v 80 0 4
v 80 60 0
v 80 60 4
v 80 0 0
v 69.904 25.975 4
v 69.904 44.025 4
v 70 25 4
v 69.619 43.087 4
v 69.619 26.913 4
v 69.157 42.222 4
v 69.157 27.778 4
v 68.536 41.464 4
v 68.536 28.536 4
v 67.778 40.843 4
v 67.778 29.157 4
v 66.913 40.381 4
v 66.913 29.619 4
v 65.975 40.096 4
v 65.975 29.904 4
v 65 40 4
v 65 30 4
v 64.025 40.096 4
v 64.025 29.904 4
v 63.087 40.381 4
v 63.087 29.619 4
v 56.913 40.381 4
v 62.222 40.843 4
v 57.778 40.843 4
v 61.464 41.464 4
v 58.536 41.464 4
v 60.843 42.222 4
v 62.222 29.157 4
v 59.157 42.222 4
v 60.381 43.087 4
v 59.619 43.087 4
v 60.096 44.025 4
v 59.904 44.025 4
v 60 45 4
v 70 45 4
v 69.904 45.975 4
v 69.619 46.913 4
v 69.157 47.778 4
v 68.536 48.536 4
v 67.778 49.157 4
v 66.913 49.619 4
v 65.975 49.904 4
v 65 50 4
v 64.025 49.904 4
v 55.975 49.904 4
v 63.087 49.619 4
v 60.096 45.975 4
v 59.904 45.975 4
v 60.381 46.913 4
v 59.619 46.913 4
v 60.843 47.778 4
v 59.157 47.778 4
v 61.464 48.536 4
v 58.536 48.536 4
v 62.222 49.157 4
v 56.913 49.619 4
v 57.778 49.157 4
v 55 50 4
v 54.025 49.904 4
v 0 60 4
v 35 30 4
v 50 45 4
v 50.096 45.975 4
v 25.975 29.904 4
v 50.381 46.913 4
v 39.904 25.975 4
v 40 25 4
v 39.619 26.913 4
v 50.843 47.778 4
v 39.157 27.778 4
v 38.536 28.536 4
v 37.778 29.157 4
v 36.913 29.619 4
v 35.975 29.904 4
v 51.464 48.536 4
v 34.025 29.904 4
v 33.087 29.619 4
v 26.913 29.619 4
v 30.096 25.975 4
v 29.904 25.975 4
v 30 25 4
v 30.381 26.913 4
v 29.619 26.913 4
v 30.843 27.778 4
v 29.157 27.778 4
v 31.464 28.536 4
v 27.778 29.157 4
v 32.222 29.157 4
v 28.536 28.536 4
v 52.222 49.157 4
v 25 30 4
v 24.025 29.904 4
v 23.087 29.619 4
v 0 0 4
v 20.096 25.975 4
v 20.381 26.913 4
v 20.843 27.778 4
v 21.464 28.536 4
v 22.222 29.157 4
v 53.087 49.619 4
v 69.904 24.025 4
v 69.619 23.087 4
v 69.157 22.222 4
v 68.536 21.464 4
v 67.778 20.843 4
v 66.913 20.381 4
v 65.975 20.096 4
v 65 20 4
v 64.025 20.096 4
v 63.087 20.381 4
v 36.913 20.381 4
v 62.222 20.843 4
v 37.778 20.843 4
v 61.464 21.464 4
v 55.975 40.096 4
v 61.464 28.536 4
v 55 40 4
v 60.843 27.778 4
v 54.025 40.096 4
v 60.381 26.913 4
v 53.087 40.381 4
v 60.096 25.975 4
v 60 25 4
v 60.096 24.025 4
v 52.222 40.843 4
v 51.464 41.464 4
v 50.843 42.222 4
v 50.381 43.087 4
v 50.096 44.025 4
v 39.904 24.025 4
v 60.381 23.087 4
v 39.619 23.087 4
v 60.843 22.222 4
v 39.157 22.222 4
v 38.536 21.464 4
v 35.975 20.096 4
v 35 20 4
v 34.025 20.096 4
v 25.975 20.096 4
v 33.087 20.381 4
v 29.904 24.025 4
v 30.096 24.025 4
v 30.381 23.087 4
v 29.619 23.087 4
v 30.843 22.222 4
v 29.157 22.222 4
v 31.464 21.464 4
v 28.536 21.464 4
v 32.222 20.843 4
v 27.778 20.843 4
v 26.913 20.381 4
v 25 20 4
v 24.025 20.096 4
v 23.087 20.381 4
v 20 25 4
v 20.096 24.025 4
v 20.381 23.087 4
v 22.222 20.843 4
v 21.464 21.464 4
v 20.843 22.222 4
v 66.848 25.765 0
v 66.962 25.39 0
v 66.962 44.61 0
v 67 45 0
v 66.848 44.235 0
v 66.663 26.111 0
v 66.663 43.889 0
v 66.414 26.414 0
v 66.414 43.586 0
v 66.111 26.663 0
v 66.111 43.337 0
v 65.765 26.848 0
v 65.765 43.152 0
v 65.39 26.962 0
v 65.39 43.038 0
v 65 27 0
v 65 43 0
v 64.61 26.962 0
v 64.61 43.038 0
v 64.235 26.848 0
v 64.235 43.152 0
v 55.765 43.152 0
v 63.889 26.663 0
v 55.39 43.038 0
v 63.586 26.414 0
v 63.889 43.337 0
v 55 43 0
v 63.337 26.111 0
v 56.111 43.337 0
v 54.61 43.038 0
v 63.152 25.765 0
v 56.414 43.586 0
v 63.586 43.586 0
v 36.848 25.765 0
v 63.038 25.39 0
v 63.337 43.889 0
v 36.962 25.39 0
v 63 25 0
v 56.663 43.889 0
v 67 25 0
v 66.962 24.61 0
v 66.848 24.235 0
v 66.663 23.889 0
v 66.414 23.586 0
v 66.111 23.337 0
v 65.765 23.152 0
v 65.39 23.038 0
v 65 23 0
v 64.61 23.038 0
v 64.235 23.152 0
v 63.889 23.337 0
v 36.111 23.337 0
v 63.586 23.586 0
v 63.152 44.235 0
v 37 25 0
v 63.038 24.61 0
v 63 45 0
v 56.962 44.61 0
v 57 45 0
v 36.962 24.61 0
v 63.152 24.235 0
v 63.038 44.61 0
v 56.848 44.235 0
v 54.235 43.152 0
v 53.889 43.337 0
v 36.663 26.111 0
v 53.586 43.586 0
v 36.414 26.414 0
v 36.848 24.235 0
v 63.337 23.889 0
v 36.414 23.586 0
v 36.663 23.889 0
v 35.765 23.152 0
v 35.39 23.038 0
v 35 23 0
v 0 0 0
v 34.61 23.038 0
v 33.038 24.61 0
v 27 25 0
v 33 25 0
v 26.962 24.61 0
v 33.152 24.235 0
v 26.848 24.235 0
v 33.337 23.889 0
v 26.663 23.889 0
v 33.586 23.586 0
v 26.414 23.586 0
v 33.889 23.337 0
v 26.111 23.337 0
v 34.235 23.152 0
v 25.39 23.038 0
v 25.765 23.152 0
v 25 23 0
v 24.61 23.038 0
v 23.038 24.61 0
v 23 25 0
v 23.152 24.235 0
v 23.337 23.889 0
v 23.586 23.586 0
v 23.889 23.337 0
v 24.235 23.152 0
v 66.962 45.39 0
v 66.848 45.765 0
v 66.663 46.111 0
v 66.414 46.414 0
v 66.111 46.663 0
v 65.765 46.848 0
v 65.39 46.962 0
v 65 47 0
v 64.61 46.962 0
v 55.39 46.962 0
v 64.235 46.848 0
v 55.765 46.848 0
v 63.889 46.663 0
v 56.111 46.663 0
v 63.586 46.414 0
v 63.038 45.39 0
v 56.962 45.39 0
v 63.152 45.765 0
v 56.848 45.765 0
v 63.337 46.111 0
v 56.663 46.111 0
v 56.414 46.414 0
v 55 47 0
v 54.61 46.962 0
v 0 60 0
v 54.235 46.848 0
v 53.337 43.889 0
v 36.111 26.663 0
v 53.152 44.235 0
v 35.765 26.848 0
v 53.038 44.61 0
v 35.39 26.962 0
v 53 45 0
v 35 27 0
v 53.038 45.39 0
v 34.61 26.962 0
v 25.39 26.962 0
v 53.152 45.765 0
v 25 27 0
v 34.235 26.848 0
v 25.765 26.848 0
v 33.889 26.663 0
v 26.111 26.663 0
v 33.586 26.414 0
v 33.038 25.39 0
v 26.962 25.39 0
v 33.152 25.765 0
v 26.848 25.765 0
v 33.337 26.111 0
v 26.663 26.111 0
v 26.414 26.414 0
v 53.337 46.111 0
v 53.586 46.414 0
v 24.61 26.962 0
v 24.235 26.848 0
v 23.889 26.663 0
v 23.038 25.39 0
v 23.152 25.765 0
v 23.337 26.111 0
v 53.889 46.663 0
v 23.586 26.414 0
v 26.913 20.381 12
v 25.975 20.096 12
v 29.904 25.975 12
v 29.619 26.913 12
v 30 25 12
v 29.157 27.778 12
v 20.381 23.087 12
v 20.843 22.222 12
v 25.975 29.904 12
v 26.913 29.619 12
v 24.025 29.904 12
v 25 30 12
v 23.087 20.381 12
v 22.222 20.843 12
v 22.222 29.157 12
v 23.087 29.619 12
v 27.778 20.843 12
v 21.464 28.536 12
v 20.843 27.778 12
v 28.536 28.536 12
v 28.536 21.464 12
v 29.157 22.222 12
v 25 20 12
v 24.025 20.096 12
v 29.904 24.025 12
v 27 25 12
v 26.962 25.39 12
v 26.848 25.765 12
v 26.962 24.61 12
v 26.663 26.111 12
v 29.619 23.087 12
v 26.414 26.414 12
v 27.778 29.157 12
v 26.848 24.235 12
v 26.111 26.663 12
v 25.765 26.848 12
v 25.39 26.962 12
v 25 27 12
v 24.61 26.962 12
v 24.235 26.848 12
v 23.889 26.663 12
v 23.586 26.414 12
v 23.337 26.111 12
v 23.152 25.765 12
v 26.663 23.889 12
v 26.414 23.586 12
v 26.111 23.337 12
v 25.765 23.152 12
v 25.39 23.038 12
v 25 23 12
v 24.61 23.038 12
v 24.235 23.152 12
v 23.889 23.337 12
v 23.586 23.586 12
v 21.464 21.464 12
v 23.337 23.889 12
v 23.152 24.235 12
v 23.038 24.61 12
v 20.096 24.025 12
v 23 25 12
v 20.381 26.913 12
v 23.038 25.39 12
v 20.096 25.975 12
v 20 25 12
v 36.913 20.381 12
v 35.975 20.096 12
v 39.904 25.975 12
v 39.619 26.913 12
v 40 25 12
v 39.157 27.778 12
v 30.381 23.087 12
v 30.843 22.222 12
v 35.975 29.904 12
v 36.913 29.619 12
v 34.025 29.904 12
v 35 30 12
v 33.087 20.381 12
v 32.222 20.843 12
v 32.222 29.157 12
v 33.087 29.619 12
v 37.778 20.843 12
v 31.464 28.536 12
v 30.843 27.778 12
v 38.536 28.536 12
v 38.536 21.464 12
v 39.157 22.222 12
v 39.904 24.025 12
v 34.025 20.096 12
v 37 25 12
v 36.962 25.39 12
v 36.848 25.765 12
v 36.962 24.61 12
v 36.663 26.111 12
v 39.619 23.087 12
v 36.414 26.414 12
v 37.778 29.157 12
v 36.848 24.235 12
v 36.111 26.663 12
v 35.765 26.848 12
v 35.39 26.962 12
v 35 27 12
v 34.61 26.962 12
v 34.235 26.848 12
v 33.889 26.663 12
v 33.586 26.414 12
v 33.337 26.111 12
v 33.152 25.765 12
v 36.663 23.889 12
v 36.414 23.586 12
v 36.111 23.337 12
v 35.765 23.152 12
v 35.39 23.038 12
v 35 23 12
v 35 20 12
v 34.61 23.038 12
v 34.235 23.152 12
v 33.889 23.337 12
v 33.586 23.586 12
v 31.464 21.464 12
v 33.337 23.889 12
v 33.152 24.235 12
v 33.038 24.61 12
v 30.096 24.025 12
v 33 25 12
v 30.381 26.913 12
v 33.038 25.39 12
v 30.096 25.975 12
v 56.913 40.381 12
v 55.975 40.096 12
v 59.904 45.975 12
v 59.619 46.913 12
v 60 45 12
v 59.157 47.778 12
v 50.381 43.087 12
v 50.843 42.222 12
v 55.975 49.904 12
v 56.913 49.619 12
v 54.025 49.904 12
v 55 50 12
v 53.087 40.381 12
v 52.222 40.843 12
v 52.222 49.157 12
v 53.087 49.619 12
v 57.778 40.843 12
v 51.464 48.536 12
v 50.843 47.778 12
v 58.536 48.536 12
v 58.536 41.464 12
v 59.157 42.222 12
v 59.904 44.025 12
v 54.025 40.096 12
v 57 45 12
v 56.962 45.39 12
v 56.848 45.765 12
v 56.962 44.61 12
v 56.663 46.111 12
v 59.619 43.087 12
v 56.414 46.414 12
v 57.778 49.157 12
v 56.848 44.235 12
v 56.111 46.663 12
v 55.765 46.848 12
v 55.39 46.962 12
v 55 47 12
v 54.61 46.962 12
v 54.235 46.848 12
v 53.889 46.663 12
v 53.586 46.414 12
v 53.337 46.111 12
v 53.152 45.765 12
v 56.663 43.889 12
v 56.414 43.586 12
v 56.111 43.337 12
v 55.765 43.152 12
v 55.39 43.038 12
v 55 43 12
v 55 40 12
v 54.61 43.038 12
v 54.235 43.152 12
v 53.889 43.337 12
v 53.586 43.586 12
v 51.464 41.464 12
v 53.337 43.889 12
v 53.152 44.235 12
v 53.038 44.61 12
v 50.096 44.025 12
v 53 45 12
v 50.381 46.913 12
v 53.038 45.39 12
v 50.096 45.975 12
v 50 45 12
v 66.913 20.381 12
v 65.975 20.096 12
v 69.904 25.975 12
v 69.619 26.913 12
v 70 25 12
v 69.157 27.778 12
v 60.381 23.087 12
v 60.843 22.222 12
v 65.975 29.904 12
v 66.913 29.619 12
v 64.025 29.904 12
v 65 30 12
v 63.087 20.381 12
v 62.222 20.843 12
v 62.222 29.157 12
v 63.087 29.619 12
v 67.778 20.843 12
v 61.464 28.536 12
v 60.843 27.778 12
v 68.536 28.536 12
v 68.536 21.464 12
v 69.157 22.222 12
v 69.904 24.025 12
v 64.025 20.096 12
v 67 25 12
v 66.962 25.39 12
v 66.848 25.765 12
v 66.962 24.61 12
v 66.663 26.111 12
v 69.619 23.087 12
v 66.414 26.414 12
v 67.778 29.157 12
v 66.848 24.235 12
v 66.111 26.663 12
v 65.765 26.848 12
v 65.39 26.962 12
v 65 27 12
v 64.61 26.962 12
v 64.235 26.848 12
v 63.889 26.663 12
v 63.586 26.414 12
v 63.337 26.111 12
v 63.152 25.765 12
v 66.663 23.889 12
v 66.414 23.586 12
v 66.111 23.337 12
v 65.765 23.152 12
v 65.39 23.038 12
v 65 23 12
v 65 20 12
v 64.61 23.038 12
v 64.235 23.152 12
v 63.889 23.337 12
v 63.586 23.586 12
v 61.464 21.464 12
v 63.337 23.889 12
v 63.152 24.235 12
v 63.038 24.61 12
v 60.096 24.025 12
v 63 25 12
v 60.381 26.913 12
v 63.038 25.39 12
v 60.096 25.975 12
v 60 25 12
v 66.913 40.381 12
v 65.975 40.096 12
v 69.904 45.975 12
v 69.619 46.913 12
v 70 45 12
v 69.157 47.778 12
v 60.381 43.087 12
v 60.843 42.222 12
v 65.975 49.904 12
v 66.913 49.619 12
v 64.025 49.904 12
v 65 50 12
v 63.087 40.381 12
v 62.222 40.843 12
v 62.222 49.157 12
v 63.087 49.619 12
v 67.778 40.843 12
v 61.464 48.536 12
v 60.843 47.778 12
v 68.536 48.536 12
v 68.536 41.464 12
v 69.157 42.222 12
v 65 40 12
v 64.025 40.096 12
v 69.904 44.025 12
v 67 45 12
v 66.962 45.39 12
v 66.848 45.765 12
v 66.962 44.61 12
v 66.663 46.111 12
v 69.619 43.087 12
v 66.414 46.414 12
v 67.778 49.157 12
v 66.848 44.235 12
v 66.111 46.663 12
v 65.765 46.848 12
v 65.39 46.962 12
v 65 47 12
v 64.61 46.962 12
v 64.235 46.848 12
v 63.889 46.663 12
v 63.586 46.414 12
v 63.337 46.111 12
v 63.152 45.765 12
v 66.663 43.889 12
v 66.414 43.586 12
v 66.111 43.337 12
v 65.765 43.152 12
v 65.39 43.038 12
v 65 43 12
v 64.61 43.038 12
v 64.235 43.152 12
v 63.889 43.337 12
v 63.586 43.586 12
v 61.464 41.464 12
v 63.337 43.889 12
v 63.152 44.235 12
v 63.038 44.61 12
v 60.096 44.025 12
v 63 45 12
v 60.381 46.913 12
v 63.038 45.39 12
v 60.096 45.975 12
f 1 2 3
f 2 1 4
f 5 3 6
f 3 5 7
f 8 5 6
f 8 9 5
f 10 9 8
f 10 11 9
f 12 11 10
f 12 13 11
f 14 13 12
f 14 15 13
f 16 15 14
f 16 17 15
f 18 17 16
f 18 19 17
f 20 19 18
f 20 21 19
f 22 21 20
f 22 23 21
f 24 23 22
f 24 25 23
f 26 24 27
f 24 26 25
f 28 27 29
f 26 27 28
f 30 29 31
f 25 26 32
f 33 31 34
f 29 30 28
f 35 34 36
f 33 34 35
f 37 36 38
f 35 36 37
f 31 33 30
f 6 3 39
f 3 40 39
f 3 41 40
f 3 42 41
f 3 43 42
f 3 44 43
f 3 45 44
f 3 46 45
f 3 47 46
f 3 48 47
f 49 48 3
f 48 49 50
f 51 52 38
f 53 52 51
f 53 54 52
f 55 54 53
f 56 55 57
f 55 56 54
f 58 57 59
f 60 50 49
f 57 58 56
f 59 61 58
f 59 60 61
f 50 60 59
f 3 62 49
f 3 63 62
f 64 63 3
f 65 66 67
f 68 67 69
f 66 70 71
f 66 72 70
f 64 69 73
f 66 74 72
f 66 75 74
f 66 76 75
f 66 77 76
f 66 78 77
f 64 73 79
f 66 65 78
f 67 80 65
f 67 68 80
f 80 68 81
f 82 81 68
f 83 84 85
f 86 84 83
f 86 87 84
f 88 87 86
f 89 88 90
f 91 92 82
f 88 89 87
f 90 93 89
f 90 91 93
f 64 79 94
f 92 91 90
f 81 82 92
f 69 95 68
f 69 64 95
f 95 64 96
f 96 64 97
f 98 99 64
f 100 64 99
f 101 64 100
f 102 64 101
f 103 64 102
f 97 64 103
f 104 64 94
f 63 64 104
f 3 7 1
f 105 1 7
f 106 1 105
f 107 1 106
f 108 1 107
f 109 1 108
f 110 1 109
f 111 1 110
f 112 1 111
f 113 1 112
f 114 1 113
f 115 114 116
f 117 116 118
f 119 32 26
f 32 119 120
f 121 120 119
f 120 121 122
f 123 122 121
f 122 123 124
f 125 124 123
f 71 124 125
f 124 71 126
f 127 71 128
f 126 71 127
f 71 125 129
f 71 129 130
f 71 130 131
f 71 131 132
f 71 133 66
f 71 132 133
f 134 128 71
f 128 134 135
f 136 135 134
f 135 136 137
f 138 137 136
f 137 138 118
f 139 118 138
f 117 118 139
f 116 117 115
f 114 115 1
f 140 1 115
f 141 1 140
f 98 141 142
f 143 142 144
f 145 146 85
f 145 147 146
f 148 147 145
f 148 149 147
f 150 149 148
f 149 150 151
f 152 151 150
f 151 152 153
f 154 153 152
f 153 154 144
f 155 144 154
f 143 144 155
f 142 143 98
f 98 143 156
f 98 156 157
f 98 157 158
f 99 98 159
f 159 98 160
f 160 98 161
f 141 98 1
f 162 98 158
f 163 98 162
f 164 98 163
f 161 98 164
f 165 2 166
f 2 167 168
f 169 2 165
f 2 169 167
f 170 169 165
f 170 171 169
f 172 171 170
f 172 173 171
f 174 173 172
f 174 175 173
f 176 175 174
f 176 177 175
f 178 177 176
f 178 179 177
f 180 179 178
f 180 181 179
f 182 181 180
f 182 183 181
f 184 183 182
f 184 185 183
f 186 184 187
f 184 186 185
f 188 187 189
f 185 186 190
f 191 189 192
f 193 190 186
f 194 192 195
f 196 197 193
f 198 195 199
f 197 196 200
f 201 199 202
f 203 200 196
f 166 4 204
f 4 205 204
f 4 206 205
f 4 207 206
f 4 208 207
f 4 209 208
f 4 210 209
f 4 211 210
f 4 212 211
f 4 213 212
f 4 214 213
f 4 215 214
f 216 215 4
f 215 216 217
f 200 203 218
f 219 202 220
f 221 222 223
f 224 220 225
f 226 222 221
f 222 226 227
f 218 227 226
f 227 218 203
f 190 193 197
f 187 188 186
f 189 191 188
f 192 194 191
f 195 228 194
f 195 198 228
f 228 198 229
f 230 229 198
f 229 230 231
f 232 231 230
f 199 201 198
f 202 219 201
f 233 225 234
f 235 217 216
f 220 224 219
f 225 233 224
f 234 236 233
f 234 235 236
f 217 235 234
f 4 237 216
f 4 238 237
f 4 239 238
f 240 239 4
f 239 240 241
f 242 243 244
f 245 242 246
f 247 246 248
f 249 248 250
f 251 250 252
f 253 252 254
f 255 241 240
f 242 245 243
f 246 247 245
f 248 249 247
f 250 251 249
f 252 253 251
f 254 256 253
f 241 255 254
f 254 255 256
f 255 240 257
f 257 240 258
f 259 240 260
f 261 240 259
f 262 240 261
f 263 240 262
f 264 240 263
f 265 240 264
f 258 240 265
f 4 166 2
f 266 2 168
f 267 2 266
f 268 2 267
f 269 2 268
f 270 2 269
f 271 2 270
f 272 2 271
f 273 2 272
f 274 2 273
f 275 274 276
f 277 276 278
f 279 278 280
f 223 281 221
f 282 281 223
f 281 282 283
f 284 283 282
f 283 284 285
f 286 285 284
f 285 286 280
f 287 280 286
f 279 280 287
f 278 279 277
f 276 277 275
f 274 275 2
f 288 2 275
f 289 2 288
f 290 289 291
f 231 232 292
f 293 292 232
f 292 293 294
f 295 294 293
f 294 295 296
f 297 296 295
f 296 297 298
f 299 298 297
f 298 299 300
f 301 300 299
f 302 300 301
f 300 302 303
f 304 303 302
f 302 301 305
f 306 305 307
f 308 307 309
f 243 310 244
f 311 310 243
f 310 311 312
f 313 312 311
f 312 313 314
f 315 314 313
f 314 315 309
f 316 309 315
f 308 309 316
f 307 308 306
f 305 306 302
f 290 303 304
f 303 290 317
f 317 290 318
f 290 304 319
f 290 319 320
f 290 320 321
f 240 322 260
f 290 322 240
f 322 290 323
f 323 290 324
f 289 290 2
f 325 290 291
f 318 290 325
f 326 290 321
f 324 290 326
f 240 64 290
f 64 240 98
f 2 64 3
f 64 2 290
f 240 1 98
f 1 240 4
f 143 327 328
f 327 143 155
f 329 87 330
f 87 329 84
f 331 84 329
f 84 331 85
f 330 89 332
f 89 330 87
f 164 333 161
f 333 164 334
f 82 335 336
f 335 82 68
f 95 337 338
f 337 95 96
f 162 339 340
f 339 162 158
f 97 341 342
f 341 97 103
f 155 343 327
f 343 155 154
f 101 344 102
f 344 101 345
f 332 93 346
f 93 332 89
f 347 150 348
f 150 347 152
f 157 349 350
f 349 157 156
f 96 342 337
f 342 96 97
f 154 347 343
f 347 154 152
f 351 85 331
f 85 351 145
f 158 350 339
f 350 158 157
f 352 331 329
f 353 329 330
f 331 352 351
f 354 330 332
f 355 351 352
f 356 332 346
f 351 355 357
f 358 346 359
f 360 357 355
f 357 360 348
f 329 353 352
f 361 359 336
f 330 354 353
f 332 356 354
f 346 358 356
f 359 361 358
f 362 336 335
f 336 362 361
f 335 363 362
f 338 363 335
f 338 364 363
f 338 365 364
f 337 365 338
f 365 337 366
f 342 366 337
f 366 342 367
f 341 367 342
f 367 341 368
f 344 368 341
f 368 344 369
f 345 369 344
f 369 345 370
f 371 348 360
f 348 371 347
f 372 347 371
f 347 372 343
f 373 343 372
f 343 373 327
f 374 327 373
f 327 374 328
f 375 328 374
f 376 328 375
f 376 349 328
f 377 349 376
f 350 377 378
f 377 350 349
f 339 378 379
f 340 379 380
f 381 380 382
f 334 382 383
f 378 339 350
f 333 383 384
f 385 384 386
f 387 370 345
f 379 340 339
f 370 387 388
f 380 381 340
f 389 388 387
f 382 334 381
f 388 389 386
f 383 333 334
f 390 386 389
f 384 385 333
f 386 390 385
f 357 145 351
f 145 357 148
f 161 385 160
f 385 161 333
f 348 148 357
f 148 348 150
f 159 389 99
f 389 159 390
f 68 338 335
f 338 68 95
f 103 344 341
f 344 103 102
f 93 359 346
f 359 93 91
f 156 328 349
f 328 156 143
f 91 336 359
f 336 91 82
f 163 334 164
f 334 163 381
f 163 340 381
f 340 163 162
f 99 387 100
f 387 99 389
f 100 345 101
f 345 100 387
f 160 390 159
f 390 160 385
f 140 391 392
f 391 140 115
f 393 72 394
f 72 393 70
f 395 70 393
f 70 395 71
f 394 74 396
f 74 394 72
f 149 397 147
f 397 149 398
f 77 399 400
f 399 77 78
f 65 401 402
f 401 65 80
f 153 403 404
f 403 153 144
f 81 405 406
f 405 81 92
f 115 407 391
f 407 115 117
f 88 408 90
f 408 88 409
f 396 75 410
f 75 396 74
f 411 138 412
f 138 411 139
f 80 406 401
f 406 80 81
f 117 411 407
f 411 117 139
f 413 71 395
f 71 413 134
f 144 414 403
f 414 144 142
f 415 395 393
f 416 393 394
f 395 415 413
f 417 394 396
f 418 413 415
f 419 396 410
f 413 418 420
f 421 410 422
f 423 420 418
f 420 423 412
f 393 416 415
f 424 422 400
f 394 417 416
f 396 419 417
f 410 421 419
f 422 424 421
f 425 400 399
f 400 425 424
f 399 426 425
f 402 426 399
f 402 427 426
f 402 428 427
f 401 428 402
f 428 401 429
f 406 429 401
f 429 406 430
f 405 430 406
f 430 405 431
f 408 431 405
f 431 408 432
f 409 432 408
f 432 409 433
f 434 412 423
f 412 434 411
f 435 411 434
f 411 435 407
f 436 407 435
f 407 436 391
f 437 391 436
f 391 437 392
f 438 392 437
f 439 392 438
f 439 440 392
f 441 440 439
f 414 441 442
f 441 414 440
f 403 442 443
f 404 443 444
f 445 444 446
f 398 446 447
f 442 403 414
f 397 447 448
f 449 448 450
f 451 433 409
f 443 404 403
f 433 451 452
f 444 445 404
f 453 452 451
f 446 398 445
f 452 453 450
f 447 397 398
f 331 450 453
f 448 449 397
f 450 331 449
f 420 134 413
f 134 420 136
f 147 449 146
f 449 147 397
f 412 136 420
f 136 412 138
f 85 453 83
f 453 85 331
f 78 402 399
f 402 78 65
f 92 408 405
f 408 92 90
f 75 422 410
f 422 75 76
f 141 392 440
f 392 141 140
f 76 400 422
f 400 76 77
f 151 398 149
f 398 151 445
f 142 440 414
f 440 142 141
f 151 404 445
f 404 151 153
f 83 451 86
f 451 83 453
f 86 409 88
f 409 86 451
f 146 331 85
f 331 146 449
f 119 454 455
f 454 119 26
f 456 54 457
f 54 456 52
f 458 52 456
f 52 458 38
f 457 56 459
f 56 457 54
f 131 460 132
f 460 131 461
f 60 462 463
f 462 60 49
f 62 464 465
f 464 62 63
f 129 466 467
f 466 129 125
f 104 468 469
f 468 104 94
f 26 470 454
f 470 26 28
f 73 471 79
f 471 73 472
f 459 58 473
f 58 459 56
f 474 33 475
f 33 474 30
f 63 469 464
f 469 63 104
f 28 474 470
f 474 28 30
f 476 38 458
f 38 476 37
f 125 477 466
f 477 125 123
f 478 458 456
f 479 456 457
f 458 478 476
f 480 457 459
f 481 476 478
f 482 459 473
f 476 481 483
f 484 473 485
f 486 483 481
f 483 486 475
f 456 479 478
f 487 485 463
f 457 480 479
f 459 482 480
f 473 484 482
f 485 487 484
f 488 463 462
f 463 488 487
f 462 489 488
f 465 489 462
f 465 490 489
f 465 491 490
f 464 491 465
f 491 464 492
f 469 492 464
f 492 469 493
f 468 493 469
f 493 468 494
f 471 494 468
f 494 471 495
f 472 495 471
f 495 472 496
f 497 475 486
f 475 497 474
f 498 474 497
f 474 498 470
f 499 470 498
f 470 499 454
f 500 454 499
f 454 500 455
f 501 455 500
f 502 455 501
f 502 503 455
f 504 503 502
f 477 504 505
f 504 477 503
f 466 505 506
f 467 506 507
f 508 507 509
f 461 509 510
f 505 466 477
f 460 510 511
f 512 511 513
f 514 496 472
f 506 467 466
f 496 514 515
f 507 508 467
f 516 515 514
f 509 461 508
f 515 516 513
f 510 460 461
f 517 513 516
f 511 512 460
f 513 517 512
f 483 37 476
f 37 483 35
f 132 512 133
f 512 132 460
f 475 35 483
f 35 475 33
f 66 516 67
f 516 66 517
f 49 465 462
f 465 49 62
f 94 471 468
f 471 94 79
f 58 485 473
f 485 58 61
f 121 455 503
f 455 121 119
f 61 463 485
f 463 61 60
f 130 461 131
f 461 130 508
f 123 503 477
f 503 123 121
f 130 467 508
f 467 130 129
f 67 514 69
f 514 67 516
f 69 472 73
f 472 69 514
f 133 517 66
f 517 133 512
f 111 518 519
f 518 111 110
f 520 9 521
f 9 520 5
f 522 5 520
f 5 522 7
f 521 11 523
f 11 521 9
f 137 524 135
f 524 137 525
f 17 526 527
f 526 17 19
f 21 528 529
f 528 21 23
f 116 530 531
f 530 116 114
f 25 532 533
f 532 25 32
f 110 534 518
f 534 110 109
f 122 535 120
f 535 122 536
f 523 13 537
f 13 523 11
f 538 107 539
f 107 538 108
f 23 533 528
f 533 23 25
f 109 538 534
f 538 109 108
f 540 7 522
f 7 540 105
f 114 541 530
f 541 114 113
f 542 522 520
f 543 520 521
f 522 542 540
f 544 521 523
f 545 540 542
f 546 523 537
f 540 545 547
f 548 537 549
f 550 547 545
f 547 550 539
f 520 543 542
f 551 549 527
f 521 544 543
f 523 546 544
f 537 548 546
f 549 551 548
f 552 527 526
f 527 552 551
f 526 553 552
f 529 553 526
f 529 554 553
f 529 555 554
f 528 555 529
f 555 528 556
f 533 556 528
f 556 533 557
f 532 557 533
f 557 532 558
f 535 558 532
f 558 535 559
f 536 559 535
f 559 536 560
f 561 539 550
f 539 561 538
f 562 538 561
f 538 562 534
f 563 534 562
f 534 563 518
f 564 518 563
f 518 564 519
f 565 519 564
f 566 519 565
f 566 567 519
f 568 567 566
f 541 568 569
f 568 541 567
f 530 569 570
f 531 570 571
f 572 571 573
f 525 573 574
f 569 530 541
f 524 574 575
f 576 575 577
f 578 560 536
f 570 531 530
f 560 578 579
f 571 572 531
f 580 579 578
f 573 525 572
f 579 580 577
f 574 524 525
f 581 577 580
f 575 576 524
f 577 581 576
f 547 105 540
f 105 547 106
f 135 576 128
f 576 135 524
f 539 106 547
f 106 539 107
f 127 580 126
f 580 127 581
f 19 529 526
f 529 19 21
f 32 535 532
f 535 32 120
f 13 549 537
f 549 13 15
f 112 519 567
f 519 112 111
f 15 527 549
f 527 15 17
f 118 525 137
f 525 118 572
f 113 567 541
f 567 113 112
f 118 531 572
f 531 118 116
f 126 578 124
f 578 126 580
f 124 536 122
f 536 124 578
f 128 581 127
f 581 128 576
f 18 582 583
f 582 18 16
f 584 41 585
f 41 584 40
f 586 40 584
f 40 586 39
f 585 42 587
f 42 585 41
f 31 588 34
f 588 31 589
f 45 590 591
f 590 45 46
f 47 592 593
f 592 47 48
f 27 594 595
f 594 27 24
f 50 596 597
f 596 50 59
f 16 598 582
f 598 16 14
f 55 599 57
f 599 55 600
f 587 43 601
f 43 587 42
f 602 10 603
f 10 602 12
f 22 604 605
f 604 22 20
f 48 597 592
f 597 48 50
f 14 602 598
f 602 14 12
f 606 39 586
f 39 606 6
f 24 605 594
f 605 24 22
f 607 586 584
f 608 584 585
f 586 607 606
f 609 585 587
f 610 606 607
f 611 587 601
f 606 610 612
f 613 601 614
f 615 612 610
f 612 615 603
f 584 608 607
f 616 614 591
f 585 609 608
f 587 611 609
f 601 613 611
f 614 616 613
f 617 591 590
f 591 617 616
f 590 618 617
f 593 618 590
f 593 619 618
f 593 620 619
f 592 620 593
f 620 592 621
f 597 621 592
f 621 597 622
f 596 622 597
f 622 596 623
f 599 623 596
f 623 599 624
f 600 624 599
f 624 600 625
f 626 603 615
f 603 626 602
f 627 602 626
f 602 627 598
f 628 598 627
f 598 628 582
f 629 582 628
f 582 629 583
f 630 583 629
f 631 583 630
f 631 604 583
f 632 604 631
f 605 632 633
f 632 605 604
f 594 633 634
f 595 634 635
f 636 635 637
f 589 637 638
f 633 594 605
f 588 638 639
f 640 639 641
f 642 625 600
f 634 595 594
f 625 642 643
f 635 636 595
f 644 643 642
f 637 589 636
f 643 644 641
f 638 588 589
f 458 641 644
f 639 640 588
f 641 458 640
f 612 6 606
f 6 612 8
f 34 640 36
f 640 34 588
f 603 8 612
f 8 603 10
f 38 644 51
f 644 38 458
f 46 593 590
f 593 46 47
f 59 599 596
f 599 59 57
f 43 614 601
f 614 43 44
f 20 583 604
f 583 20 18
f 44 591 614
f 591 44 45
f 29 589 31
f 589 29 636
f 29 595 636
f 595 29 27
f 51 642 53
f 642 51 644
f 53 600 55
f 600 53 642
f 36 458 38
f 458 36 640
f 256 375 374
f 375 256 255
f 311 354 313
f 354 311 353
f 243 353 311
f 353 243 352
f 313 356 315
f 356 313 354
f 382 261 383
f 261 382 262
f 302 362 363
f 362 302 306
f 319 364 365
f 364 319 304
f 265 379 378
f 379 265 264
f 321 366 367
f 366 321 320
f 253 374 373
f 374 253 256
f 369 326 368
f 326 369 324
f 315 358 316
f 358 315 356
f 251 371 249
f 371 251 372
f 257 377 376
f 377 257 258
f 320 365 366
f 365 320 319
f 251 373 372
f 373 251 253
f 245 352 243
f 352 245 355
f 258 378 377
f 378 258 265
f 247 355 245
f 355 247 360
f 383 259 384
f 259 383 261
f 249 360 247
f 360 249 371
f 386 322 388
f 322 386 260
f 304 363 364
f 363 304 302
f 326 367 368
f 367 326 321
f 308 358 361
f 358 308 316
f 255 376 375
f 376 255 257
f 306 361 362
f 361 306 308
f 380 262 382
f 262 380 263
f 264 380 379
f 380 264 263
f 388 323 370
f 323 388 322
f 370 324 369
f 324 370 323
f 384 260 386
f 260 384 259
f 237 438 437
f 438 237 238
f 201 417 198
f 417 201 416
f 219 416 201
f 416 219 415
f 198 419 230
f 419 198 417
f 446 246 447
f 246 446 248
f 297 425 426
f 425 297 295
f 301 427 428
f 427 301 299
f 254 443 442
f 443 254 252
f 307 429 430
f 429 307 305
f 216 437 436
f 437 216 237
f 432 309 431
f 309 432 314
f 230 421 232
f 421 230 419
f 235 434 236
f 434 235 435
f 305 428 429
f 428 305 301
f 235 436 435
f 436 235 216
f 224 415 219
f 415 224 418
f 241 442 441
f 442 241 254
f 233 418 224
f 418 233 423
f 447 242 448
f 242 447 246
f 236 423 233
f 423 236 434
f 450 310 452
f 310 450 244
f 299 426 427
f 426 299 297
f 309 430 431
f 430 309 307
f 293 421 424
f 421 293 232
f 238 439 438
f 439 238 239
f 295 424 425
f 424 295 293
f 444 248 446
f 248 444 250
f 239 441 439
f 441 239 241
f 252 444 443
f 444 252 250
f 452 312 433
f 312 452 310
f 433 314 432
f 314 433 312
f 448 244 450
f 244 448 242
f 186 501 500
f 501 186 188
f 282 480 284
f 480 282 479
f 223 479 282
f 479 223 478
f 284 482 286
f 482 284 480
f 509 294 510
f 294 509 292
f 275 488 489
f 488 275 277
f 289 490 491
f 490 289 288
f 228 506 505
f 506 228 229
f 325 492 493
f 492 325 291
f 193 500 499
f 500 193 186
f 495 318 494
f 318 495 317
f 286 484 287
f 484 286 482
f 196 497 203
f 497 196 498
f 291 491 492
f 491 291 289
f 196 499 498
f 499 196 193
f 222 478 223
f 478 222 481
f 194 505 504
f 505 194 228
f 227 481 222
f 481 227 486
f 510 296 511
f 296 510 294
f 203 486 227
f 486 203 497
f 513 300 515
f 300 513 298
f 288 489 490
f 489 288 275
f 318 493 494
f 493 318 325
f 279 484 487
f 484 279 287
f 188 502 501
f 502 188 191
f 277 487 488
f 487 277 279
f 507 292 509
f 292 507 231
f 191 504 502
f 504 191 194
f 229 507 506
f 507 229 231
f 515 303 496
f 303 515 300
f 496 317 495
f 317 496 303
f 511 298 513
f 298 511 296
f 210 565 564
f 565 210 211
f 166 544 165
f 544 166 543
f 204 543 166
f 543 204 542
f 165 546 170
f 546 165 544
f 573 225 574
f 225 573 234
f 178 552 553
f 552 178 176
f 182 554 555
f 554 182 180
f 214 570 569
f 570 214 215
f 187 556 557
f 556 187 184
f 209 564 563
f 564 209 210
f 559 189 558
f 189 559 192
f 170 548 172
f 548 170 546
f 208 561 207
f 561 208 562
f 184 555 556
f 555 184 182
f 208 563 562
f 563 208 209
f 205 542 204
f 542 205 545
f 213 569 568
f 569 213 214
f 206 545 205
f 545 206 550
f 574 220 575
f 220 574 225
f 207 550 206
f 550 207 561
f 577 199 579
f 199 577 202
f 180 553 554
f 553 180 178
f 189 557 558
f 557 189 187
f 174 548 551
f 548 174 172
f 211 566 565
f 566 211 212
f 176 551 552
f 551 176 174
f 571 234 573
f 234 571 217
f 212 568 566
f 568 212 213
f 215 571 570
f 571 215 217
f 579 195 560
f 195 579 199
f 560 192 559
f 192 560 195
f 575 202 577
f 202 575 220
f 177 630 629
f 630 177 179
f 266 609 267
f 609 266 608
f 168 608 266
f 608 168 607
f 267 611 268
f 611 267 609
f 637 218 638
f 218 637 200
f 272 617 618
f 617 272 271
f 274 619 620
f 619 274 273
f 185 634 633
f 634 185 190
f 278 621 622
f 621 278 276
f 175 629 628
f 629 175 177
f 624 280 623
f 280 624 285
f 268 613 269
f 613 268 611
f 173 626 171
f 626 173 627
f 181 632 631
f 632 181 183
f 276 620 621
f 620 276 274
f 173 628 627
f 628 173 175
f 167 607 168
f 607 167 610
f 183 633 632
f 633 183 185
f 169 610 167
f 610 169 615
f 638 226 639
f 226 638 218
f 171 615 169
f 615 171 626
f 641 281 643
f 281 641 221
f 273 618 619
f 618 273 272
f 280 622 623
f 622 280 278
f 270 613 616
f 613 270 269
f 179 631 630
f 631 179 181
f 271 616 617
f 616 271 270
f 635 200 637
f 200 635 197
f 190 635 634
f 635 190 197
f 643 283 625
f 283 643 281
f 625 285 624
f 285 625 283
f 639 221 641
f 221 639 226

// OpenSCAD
$fn = 32;

// ----------------------------------------------------------------------
// Boss field: plate with bosses at given coordinates
// ----------------------------------------------------------------------

// --- parameters (mm) ---
plate_l = 80;             // plate length, X
plate_w = 60;             // plate width, Y
plate_t = 4;              // plate thickness, Z
boss_d = 10;              // boss diameter
boss_h = 8;               // boss height above the plate
bore_d = 4;               // boss bore

total_h = plate_t + boss_h;  // overall height

difference() {
  union() {
    cube([plate_l, plate_w, plate_t]);
    translate([25, 25, plate_t]) cylinder(h = boss_h, d = boss_d);
    translate([35, 25, plate_t]) cylinder(h = boss_h, d = boss_d);
    translate([55, 45, plate_t]) cylinder(h = boss_h, d = boss_d);
    translate([65, 25, plate_t]) cylinder(h = boss_h, d = boss_d);
    translate([65, 45, plate_t]) cylinder(h = boss_h, d = boss_d);
  }
  translate([25, 25, -1]) cylinder(h = total_h + 2, d = bore_d);
  translate([35, 25, -1]) cylinder(h = total_h + 2, d = bore_d);
  translate([55, 45, -1]) cylinder(h = total_h + 2, d = bore_d);
  translate([65, 25, -1]) cylinder(h = total_h + 2, d = bore_d);
  translate([65, 45, -1]) cylinder(h = total_h + 2, d = bore_d);
}
